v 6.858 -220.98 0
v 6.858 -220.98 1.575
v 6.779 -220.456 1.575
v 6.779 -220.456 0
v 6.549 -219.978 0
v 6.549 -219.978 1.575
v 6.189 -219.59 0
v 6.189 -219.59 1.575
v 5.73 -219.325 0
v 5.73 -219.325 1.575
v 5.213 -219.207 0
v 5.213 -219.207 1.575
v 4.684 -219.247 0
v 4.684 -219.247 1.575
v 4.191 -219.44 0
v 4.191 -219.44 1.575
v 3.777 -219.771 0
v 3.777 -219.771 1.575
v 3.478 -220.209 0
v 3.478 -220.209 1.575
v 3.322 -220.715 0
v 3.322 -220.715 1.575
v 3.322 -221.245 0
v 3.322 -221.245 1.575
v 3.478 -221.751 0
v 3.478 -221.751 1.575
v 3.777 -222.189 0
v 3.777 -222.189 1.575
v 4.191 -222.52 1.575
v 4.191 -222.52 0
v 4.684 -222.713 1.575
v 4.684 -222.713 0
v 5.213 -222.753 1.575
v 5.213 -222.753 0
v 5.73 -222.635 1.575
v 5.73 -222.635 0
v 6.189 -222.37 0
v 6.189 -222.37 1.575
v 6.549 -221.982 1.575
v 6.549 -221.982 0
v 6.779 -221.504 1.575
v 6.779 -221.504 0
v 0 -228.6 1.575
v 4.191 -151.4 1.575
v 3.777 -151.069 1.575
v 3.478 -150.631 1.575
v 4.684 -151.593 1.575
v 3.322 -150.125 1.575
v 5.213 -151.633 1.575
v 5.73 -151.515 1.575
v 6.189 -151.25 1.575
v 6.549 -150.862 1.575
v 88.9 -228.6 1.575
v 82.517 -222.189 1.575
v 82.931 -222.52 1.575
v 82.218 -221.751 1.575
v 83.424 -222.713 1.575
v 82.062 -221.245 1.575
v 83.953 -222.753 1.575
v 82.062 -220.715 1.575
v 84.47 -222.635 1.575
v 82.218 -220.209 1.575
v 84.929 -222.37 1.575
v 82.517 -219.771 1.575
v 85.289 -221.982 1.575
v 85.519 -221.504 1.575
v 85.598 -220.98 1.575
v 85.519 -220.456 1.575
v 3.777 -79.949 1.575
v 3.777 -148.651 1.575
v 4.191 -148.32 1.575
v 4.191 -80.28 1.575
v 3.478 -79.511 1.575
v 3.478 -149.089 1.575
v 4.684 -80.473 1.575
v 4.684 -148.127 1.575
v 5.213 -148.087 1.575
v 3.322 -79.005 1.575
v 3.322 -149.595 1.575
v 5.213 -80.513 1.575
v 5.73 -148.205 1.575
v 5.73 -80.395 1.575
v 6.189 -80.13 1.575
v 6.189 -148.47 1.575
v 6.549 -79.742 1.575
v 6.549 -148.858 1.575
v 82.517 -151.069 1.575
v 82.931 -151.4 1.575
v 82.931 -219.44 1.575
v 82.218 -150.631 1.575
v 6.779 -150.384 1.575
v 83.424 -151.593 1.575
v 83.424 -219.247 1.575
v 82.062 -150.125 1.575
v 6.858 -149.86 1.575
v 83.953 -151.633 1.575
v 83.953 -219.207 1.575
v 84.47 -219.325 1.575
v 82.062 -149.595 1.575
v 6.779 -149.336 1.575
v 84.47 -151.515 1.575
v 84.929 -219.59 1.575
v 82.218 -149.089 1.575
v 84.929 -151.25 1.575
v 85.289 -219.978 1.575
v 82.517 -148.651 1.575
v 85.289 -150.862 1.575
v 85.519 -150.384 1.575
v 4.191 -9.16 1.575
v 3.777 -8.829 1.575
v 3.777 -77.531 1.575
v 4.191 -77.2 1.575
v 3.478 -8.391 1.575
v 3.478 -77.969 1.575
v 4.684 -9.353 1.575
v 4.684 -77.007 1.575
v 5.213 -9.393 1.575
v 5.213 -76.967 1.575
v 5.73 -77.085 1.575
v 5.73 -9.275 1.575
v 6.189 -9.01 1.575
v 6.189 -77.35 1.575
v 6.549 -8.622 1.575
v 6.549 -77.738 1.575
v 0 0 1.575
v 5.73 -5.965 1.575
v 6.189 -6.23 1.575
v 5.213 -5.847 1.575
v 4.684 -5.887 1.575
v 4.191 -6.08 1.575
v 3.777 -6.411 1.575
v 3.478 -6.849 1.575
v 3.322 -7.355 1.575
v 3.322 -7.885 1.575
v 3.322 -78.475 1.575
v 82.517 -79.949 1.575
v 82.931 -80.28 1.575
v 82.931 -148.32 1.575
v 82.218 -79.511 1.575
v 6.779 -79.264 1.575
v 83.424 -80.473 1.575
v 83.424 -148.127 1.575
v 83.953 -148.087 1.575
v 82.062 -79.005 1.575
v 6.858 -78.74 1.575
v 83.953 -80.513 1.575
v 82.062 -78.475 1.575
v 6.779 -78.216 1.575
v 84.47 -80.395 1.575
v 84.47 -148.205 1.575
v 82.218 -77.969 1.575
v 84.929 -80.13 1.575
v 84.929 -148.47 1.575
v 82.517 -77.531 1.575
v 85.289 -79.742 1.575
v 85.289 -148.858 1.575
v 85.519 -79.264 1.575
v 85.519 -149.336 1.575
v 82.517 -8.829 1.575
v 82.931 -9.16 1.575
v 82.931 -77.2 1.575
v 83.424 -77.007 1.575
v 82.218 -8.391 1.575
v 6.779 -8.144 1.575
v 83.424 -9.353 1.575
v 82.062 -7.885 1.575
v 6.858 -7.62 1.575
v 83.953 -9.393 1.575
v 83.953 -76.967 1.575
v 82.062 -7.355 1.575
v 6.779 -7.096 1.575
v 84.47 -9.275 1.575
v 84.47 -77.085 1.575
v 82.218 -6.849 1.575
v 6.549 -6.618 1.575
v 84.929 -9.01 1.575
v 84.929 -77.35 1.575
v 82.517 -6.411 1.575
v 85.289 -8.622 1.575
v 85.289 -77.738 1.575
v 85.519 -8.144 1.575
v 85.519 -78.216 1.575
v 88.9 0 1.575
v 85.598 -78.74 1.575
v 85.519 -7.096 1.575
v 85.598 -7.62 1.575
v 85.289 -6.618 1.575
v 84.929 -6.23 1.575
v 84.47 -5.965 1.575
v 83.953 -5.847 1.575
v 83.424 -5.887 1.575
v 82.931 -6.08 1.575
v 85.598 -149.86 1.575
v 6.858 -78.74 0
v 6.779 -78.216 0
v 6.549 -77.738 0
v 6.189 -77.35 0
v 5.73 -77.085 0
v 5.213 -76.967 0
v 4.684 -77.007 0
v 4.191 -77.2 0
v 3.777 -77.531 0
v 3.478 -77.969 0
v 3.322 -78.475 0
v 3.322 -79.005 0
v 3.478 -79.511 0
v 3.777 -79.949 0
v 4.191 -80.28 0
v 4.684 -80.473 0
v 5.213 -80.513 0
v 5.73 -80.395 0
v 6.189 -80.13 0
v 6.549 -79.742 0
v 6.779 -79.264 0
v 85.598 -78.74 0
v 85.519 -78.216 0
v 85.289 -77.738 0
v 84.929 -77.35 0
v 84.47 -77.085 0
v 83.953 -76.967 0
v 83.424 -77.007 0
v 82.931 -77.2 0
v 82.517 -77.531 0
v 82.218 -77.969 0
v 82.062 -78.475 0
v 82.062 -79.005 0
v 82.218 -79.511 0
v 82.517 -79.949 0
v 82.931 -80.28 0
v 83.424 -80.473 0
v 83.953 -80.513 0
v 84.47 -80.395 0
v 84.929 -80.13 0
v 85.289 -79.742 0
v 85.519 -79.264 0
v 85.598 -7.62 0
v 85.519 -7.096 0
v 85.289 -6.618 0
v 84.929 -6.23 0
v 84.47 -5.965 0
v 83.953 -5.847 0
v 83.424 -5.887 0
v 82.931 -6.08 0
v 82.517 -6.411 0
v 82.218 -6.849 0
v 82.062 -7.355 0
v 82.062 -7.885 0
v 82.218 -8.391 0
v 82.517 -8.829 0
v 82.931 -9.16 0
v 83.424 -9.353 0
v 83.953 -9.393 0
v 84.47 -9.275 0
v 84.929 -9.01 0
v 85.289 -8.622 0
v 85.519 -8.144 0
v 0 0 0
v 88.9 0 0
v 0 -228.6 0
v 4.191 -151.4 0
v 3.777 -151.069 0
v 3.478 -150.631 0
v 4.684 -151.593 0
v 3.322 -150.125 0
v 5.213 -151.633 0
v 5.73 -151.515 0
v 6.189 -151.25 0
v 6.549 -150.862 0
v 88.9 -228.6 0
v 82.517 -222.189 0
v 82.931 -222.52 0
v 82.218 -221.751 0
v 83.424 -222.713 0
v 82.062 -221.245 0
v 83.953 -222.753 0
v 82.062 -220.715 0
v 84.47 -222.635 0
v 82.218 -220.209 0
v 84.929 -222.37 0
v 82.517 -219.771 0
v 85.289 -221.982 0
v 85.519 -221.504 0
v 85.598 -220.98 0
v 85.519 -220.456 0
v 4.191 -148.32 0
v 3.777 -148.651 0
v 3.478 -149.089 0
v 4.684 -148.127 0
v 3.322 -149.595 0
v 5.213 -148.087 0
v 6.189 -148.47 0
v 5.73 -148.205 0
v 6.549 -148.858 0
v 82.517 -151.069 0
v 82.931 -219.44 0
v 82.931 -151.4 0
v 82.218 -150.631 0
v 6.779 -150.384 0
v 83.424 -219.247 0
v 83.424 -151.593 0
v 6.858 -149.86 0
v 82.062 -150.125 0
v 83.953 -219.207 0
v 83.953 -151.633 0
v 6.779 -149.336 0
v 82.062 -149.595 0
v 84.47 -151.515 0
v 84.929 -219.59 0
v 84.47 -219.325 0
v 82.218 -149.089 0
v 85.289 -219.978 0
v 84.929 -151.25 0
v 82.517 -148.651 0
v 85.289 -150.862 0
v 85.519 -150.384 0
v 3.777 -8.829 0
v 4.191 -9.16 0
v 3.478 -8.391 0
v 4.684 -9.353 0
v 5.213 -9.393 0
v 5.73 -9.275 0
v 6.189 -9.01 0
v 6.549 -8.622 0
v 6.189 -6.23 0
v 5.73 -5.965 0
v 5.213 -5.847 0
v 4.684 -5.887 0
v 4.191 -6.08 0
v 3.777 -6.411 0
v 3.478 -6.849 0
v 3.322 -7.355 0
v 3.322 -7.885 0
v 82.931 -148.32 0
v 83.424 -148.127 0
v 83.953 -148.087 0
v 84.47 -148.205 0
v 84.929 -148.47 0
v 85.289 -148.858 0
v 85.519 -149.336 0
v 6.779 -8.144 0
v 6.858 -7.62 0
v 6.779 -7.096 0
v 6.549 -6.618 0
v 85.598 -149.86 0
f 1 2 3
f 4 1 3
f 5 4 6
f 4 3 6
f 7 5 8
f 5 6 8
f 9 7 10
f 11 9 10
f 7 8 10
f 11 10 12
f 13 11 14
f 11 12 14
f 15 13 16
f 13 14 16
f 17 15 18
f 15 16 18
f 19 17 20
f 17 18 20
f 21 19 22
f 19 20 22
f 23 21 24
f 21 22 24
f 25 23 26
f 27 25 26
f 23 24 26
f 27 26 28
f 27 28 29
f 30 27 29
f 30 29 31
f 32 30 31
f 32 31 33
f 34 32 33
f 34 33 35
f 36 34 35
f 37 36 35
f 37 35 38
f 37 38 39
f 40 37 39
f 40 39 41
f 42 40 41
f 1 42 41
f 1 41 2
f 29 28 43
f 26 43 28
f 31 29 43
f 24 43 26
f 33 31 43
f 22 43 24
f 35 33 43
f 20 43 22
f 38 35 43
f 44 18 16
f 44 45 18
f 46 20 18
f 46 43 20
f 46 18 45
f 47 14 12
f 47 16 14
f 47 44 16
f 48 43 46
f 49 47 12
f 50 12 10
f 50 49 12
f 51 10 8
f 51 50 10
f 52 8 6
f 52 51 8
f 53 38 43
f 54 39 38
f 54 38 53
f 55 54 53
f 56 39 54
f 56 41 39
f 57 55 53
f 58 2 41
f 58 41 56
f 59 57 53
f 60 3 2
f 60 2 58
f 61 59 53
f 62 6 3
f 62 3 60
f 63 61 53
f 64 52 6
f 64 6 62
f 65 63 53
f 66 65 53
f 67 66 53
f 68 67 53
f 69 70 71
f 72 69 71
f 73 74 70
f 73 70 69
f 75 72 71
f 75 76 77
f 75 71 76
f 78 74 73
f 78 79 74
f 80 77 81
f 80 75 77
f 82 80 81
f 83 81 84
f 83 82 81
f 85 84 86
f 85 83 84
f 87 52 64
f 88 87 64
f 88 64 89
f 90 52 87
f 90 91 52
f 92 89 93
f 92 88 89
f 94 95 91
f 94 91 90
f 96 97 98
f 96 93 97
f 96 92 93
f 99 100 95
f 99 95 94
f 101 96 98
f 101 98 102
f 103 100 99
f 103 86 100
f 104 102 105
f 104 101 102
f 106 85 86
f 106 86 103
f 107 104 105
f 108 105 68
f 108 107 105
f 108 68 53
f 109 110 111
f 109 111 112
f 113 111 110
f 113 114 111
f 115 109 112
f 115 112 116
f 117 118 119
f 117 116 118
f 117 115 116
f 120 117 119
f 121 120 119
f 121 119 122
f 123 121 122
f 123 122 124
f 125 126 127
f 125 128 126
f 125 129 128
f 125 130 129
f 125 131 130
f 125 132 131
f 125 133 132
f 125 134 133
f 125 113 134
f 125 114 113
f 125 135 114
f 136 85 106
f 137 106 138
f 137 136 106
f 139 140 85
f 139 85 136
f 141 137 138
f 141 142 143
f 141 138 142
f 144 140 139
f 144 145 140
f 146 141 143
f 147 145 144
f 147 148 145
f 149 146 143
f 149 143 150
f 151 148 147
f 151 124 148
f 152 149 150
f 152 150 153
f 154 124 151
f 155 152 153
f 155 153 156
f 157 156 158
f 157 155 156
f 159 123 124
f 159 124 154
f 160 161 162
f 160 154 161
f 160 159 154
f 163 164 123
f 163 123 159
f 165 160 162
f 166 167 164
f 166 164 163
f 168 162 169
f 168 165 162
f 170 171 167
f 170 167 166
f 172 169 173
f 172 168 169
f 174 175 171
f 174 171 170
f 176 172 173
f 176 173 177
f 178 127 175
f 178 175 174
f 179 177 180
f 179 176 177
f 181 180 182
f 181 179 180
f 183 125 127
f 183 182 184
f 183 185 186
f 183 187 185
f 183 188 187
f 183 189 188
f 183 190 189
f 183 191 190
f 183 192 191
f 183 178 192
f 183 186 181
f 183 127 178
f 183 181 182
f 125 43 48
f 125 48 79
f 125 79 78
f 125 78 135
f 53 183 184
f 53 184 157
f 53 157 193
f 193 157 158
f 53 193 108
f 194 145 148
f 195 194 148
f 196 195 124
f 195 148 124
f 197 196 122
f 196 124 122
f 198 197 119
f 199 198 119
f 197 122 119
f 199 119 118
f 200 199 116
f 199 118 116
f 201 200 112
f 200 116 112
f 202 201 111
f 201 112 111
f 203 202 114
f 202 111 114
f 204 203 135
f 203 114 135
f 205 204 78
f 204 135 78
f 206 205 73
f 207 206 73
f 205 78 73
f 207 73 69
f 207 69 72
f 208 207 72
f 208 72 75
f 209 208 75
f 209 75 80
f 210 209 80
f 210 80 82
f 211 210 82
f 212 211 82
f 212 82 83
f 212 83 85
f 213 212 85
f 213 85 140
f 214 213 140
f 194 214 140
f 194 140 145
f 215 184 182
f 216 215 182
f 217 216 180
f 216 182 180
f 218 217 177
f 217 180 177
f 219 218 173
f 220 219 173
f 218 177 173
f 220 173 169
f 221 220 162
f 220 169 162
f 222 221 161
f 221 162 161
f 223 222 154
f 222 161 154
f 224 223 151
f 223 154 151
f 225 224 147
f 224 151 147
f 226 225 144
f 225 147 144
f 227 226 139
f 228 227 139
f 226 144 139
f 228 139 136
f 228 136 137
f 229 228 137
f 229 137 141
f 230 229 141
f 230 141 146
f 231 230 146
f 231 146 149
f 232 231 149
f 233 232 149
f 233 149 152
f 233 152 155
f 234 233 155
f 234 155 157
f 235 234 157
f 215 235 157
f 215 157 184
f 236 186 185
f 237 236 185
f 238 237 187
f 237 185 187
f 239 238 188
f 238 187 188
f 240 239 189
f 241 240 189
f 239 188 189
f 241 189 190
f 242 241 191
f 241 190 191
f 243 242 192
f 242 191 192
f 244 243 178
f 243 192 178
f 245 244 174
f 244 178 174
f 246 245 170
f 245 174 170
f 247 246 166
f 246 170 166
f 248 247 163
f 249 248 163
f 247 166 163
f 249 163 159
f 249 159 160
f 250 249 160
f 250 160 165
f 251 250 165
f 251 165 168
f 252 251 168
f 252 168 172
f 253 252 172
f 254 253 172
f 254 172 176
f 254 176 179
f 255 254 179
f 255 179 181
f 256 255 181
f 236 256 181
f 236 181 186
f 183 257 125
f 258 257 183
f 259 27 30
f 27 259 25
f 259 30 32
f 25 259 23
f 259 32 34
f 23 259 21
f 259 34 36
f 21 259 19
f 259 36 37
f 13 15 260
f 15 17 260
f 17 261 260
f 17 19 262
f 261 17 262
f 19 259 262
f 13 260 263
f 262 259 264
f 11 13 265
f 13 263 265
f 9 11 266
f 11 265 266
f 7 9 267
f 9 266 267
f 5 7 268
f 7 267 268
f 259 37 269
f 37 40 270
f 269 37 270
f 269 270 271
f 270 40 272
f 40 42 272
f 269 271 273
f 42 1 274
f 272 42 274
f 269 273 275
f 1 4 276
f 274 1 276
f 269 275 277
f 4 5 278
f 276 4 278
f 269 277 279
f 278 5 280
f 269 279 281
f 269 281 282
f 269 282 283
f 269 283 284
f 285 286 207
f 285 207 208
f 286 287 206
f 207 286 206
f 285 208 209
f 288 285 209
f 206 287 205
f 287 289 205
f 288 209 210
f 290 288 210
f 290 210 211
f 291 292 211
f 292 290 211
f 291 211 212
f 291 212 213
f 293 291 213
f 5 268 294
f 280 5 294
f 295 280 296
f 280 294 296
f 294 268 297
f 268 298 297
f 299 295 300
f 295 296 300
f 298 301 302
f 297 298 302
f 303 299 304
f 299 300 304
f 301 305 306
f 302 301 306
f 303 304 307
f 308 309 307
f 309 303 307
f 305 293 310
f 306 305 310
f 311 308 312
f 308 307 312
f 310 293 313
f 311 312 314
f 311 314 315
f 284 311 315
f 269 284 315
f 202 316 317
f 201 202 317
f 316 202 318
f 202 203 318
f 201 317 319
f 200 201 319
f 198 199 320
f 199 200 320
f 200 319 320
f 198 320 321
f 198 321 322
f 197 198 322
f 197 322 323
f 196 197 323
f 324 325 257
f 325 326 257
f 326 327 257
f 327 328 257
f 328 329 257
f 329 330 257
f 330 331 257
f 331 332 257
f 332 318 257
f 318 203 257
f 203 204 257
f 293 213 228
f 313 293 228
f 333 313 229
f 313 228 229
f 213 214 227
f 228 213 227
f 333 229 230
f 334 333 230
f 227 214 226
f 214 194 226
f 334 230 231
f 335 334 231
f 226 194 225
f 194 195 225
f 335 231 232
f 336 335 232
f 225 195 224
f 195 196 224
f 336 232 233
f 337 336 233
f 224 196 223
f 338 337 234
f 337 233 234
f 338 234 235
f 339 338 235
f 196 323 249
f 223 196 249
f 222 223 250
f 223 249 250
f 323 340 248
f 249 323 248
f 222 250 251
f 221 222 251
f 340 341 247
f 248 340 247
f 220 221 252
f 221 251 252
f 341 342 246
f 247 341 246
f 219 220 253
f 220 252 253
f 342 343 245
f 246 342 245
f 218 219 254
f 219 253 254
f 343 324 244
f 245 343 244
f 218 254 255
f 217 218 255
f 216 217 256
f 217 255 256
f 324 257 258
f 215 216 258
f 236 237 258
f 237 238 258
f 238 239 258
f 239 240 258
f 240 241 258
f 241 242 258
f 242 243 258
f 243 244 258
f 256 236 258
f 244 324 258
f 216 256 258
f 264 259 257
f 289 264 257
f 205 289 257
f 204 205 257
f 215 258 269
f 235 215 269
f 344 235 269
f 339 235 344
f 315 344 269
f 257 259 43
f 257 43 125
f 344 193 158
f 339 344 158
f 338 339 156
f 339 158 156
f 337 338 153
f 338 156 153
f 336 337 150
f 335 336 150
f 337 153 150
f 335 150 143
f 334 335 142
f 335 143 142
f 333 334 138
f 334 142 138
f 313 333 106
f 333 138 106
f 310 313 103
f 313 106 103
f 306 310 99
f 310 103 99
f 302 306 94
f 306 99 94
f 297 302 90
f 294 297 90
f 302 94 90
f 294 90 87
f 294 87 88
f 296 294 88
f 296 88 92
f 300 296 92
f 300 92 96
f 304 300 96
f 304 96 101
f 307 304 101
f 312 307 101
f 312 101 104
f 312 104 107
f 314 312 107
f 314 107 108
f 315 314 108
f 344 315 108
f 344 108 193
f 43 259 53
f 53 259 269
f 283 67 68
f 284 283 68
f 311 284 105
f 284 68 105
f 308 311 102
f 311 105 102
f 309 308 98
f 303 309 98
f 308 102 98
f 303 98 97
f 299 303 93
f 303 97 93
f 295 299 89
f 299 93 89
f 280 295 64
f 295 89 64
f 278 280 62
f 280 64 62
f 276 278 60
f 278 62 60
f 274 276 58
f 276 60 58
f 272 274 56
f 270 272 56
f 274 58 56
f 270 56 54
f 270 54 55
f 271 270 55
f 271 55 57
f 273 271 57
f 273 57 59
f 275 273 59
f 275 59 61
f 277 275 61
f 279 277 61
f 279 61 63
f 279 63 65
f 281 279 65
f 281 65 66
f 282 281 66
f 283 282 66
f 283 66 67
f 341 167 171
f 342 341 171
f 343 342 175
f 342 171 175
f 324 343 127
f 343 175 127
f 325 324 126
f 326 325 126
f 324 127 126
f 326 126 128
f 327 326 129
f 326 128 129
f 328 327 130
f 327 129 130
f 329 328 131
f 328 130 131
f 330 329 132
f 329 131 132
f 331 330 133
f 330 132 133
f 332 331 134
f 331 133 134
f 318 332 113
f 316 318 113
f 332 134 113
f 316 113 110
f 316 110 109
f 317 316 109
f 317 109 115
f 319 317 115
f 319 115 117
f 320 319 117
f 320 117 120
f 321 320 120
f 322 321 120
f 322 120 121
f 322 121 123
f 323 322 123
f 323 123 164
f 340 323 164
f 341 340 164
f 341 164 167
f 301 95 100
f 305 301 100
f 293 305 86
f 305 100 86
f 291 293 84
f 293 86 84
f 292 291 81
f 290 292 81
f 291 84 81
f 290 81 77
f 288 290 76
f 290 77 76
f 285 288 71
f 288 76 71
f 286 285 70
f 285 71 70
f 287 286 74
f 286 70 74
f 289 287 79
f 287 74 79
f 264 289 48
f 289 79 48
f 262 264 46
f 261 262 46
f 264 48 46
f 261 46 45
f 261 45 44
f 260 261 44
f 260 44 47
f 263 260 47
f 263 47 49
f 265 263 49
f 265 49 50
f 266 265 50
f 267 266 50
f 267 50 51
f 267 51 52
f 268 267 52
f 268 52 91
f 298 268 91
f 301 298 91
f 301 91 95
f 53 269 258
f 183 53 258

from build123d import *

# Parameters (mm, degrees)
SKETCH1_W            = 88.9
SKETCH1_H            = 228.6
EXTRUDE1_DEPTH       = 1.5748
SKETCH2_R            = 1.778
CUT_EXTRUDE1_DEPTH   = 2.54
LPATTERN1_COUNT      = 2
LPATTERN1_PITCH      = 78.74
LPATTERN1_COUNT_DIR2 = 4
LPATTERN1_PITCH_DIR2 = 71.12


with BuildPart() as part:
    # Sketch1 → Extrude1 (new body)
    with BuildSketch(Plane.XY):
        with Locations((44.45, -114.3)):
            Rectangle(SKETCH1_W, SKETCH1_H)
    extrude(amount=EXTRUDE1_DEPTH)

    # Sketch2 → Cut-Extrude1 (cut)
    with BuildSketch(Plane.XY.offset(1.5748)):
        with Locations((5.08, -7.62)):
            Circle(SKETCH2_R)
    cut_extrude1 = extrude(amount=-CUT_EXTRUDE1_DEPTH, mode=Mode.SUBTRACT)

    # LPattern1: Cut-Extrude1 2 × 4
    with Locations(*[(i * LPATTERN1_PITCH, -j * LPATTERN1_PITCH_DIR2, 0) for i in range(LPATTERN1_COUNT) for j in range(LPATTERN1_COUNT_DIR2) if (i, j) != (0, 0)]):
        add(cut_extrude1, mode=Mode.SUBTRACT)


solid = part.part
